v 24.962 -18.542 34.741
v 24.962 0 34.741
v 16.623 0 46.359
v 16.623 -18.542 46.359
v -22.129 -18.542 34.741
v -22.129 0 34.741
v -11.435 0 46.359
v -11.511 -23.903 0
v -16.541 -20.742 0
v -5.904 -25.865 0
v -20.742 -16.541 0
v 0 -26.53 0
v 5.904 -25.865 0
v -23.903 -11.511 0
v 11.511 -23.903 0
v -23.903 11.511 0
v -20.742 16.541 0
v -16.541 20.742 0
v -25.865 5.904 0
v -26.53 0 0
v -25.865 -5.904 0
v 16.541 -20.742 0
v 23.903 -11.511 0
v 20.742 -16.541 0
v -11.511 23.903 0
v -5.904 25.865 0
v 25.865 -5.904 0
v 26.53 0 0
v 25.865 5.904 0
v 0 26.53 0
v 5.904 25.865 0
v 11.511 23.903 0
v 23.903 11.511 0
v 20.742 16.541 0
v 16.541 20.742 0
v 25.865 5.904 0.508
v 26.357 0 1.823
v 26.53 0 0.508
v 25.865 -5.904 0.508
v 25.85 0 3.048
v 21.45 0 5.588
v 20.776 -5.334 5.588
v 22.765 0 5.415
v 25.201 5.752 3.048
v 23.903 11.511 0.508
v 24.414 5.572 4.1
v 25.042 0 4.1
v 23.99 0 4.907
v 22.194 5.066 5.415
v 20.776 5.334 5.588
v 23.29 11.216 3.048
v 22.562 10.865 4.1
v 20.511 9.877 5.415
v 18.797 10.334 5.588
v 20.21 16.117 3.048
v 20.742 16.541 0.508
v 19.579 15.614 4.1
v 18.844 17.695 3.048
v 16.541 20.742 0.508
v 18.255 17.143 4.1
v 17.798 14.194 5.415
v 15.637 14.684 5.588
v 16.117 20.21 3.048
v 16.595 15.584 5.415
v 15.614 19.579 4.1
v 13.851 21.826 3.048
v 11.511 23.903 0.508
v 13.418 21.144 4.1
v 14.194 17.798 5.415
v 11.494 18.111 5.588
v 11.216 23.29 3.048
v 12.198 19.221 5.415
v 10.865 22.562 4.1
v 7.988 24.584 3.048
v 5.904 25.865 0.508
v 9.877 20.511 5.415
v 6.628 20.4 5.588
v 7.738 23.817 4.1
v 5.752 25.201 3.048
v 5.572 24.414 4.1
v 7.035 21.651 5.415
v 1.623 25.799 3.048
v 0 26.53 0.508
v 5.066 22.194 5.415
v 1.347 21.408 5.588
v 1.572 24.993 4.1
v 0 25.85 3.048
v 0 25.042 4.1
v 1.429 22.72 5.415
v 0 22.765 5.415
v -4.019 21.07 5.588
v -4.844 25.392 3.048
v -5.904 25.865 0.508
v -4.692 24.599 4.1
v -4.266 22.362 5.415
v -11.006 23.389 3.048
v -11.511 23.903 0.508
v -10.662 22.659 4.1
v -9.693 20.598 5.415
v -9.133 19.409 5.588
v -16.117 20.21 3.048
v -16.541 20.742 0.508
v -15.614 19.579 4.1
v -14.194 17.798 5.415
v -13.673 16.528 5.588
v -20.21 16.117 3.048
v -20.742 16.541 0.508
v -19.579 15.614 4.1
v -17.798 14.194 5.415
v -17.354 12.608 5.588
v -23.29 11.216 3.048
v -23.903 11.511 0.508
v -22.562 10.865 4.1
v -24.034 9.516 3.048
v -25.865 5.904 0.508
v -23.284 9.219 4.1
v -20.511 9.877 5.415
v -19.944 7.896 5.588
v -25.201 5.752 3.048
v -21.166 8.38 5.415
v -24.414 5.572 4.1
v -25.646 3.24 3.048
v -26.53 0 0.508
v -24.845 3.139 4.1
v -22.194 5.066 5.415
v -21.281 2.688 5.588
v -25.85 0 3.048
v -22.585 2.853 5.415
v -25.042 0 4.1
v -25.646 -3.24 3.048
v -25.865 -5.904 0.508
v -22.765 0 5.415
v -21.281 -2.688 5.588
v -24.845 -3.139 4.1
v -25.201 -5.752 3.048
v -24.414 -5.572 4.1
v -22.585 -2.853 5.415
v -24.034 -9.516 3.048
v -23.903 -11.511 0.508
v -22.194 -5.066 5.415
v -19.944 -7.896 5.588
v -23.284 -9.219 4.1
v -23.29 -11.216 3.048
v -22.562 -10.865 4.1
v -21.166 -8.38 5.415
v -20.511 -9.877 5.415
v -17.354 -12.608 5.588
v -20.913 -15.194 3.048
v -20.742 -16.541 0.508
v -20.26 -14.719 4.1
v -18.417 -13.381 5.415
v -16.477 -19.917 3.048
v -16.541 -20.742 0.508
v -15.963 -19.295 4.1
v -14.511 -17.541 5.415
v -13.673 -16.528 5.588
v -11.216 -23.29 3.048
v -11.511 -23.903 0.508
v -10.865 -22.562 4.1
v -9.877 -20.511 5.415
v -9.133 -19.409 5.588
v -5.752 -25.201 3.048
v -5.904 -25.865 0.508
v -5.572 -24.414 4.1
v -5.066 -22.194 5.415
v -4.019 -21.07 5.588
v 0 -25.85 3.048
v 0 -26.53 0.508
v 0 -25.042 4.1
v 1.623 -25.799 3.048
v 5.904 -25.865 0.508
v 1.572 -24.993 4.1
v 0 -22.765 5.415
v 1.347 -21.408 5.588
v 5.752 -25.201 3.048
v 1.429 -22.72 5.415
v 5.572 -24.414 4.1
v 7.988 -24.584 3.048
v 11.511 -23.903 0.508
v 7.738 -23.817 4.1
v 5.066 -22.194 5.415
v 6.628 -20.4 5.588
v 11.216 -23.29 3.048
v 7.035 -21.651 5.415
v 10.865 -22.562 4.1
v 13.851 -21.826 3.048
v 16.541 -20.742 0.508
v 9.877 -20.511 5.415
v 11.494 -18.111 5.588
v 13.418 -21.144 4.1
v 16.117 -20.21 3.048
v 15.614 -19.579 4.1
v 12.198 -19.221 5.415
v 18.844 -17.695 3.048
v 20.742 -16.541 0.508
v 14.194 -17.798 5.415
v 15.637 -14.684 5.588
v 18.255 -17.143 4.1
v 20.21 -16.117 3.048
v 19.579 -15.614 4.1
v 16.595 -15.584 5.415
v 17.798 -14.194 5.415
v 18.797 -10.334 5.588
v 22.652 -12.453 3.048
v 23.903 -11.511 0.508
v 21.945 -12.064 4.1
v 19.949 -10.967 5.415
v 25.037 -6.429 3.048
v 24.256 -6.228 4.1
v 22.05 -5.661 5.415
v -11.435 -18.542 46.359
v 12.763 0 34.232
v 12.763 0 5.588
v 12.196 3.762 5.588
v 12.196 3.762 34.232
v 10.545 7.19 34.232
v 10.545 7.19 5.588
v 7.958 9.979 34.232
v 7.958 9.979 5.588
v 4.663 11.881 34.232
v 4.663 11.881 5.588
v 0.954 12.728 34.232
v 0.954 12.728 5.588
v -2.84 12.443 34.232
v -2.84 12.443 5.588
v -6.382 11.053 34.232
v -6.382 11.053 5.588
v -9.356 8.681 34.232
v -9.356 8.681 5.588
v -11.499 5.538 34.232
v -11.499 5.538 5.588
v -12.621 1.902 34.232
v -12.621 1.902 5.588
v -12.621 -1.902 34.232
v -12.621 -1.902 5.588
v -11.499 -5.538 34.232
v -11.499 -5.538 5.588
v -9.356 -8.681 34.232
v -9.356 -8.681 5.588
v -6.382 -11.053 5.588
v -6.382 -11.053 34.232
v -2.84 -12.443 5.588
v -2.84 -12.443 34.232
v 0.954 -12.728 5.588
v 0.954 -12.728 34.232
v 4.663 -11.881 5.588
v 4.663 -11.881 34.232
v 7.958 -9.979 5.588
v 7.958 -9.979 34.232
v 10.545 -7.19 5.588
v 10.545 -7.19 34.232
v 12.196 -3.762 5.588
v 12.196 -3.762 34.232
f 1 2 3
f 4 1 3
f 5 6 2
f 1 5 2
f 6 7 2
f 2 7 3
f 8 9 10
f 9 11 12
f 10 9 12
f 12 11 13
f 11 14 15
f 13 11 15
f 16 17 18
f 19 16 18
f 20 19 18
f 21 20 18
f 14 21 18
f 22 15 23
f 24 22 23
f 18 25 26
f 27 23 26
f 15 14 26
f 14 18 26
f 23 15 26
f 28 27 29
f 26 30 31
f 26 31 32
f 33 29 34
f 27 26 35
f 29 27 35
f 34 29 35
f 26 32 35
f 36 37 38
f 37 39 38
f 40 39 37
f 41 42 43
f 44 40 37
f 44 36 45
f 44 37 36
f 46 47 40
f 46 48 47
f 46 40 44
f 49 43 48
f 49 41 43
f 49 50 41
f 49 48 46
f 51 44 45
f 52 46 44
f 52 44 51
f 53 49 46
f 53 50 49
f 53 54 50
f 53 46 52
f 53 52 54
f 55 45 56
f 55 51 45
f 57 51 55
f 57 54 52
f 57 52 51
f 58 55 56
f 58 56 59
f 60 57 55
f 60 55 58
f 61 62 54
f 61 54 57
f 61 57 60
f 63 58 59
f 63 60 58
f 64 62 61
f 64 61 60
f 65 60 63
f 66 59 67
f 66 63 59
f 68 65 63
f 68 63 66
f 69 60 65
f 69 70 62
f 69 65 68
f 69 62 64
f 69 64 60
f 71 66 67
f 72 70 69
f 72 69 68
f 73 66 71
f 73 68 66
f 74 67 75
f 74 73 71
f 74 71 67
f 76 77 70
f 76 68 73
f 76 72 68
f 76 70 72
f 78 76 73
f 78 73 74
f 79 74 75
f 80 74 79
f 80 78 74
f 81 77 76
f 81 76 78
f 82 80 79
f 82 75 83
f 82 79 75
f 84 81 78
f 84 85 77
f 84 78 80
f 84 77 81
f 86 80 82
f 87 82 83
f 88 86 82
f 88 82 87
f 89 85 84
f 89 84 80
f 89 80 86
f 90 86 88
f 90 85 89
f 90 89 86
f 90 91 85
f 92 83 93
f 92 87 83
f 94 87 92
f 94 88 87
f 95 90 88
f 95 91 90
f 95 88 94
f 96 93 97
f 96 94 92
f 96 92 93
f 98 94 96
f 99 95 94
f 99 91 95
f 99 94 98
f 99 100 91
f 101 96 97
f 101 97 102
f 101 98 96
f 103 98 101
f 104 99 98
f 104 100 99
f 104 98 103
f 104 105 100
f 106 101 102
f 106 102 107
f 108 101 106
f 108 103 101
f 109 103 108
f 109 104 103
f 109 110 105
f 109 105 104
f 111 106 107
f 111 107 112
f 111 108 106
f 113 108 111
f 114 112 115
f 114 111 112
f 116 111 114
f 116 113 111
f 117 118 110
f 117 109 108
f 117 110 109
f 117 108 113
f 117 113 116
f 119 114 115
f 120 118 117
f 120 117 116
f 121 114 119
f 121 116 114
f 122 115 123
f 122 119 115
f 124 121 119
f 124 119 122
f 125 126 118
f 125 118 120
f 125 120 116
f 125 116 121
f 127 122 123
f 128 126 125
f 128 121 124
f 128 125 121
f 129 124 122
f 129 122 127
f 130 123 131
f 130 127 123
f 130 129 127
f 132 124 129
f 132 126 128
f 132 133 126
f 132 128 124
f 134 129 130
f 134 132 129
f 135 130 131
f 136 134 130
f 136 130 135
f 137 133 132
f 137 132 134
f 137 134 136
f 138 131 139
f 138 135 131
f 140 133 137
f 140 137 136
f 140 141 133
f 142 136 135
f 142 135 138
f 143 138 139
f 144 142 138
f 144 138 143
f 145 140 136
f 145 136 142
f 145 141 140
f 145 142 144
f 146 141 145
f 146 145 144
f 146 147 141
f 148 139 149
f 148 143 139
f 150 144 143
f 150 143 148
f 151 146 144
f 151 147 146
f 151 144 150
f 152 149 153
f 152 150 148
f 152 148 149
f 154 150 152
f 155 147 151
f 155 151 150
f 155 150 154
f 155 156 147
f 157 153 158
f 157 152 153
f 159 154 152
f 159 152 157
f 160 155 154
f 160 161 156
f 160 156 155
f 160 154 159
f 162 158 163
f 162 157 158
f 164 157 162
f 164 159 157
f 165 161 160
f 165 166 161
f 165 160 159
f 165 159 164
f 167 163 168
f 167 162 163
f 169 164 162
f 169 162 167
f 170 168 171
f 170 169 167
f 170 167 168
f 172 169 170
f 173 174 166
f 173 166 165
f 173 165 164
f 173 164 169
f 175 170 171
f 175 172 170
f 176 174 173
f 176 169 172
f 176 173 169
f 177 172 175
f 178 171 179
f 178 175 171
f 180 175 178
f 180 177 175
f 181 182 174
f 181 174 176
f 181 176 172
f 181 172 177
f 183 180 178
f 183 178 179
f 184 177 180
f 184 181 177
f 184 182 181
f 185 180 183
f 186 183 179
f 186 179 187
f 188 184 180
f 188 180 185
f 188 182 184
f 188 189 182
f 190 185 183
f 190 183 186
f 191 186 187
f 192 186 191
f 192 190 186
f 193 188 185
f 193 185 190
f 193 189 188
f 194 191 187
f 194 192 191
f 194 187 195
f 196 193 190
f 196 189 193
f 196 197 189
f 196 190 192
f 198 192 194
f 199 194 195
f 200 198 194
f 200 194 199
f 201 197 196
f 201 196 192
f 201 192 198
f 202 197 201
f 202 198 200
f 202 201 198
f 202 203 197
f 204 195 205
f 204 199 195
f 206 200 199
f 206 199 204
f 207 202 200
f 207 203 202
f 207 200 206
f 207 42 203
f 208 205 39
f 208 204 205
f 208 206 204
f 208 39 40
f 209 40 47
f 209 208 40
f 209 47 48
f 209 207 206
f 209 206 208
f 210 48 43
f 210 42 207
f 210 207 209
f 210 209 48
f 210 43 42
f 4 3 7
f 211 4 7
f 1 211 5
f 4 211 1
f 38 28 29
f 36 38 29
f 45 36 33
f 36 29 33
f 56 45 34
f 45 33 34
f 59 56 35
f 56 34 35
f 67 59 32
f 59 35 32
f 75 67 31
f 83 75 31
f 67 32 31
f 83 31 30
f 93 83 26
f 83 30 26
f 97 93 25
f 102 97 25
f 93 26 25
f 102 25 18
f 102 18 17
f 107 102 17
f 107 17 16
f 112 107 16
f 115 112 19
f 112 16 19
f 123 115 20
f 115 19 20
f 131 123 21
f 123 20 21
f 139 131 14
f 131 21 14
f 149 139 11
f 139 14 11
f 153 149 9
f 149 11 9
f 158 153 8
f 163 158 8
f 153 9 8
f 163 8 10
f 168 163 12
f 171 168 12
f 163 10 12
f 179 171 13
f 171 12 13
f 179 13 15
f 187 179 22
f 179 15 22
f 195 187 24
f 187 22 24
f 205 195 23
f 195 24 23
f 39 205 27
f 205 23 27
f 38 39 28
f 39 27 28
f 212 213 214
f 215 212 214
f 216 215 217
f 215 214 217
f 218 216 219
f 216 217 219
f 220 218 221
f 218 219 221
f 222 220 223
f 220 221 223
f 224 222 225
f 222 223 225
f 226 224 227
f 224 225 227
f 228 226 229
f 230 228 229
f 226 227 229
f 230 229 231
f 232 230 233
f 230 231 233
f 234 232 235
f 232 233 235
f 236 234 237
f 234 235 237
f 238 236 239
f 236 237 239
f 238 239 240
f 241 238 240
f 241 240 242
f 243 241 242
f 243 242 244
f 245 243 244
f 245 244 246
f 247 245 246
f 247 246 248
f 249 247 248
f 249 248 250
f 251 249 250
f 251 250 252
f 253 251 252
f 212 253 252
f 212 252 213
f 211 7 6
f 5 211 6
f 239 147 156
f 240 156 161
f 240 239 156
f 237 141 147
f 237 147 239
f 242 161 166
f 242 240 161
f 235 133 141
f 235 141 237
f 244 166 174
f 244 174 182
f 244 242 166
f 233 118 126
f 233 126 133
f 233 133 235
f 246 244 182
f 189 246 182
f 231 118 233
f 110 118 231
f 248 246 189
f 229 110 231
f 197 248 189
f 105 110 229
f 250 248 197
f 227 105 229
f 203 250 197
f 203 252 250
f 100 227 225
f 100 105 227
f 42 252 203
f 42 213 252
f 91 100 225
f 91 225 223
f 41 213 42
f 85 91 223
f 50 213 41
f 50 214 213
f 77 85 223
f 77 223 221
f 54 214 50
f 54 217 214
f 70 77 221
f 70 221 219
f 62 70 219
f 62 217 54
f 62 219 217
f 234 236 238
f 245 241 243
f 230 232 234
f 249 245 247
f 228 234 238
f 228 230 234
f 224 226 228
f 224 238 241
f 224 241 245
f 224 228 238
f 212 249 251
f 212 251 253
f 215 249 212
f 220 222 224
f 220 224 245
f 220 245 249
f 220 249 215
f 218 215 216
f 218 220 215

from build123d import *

# Parameters (mm, degrees)
F0_R     = 26.530172
F1_DEPTH = 5.587771
F2_R     = 12.763235
F3_DEPTH = 34.231685
F5_DEPTH = 18.542
F6_R     = 5.08


with BuildPart() as f1:
    # F0 (on Top) → F1 (new body)
    with BuildSketch(Plane.XY):
        Circle(F0_R)
    extrude(amount=F1_DEPTH)

    # F2 (on Top) → F3 (join)
    with BuildSketch(Plane.XY):
        Circle(F2_R)
    extrude(amount=F3_DEPTH)

    # F6
    f6_edges = [f1.edges().sort_by_distance(p)[0] for p in [
        (-26.530172, 0, 5.587771),
    ]]
    fillet(f6_edges, radius=F6_R)


with BuildPart() as f5:
    # F4 (on Front) → F5 (new body)
    with BuildSketch(Plane.XZ):
        Polygon((-22.129066, 34.740608), (0, 34.740608), (24.962415, 34.740608), (16.623402, 46.359368), (-11.434621, 46.359368), align=None)
    extrude(amount=F5_DEPTH)


solid = Compound([f1.part, f5.part])
